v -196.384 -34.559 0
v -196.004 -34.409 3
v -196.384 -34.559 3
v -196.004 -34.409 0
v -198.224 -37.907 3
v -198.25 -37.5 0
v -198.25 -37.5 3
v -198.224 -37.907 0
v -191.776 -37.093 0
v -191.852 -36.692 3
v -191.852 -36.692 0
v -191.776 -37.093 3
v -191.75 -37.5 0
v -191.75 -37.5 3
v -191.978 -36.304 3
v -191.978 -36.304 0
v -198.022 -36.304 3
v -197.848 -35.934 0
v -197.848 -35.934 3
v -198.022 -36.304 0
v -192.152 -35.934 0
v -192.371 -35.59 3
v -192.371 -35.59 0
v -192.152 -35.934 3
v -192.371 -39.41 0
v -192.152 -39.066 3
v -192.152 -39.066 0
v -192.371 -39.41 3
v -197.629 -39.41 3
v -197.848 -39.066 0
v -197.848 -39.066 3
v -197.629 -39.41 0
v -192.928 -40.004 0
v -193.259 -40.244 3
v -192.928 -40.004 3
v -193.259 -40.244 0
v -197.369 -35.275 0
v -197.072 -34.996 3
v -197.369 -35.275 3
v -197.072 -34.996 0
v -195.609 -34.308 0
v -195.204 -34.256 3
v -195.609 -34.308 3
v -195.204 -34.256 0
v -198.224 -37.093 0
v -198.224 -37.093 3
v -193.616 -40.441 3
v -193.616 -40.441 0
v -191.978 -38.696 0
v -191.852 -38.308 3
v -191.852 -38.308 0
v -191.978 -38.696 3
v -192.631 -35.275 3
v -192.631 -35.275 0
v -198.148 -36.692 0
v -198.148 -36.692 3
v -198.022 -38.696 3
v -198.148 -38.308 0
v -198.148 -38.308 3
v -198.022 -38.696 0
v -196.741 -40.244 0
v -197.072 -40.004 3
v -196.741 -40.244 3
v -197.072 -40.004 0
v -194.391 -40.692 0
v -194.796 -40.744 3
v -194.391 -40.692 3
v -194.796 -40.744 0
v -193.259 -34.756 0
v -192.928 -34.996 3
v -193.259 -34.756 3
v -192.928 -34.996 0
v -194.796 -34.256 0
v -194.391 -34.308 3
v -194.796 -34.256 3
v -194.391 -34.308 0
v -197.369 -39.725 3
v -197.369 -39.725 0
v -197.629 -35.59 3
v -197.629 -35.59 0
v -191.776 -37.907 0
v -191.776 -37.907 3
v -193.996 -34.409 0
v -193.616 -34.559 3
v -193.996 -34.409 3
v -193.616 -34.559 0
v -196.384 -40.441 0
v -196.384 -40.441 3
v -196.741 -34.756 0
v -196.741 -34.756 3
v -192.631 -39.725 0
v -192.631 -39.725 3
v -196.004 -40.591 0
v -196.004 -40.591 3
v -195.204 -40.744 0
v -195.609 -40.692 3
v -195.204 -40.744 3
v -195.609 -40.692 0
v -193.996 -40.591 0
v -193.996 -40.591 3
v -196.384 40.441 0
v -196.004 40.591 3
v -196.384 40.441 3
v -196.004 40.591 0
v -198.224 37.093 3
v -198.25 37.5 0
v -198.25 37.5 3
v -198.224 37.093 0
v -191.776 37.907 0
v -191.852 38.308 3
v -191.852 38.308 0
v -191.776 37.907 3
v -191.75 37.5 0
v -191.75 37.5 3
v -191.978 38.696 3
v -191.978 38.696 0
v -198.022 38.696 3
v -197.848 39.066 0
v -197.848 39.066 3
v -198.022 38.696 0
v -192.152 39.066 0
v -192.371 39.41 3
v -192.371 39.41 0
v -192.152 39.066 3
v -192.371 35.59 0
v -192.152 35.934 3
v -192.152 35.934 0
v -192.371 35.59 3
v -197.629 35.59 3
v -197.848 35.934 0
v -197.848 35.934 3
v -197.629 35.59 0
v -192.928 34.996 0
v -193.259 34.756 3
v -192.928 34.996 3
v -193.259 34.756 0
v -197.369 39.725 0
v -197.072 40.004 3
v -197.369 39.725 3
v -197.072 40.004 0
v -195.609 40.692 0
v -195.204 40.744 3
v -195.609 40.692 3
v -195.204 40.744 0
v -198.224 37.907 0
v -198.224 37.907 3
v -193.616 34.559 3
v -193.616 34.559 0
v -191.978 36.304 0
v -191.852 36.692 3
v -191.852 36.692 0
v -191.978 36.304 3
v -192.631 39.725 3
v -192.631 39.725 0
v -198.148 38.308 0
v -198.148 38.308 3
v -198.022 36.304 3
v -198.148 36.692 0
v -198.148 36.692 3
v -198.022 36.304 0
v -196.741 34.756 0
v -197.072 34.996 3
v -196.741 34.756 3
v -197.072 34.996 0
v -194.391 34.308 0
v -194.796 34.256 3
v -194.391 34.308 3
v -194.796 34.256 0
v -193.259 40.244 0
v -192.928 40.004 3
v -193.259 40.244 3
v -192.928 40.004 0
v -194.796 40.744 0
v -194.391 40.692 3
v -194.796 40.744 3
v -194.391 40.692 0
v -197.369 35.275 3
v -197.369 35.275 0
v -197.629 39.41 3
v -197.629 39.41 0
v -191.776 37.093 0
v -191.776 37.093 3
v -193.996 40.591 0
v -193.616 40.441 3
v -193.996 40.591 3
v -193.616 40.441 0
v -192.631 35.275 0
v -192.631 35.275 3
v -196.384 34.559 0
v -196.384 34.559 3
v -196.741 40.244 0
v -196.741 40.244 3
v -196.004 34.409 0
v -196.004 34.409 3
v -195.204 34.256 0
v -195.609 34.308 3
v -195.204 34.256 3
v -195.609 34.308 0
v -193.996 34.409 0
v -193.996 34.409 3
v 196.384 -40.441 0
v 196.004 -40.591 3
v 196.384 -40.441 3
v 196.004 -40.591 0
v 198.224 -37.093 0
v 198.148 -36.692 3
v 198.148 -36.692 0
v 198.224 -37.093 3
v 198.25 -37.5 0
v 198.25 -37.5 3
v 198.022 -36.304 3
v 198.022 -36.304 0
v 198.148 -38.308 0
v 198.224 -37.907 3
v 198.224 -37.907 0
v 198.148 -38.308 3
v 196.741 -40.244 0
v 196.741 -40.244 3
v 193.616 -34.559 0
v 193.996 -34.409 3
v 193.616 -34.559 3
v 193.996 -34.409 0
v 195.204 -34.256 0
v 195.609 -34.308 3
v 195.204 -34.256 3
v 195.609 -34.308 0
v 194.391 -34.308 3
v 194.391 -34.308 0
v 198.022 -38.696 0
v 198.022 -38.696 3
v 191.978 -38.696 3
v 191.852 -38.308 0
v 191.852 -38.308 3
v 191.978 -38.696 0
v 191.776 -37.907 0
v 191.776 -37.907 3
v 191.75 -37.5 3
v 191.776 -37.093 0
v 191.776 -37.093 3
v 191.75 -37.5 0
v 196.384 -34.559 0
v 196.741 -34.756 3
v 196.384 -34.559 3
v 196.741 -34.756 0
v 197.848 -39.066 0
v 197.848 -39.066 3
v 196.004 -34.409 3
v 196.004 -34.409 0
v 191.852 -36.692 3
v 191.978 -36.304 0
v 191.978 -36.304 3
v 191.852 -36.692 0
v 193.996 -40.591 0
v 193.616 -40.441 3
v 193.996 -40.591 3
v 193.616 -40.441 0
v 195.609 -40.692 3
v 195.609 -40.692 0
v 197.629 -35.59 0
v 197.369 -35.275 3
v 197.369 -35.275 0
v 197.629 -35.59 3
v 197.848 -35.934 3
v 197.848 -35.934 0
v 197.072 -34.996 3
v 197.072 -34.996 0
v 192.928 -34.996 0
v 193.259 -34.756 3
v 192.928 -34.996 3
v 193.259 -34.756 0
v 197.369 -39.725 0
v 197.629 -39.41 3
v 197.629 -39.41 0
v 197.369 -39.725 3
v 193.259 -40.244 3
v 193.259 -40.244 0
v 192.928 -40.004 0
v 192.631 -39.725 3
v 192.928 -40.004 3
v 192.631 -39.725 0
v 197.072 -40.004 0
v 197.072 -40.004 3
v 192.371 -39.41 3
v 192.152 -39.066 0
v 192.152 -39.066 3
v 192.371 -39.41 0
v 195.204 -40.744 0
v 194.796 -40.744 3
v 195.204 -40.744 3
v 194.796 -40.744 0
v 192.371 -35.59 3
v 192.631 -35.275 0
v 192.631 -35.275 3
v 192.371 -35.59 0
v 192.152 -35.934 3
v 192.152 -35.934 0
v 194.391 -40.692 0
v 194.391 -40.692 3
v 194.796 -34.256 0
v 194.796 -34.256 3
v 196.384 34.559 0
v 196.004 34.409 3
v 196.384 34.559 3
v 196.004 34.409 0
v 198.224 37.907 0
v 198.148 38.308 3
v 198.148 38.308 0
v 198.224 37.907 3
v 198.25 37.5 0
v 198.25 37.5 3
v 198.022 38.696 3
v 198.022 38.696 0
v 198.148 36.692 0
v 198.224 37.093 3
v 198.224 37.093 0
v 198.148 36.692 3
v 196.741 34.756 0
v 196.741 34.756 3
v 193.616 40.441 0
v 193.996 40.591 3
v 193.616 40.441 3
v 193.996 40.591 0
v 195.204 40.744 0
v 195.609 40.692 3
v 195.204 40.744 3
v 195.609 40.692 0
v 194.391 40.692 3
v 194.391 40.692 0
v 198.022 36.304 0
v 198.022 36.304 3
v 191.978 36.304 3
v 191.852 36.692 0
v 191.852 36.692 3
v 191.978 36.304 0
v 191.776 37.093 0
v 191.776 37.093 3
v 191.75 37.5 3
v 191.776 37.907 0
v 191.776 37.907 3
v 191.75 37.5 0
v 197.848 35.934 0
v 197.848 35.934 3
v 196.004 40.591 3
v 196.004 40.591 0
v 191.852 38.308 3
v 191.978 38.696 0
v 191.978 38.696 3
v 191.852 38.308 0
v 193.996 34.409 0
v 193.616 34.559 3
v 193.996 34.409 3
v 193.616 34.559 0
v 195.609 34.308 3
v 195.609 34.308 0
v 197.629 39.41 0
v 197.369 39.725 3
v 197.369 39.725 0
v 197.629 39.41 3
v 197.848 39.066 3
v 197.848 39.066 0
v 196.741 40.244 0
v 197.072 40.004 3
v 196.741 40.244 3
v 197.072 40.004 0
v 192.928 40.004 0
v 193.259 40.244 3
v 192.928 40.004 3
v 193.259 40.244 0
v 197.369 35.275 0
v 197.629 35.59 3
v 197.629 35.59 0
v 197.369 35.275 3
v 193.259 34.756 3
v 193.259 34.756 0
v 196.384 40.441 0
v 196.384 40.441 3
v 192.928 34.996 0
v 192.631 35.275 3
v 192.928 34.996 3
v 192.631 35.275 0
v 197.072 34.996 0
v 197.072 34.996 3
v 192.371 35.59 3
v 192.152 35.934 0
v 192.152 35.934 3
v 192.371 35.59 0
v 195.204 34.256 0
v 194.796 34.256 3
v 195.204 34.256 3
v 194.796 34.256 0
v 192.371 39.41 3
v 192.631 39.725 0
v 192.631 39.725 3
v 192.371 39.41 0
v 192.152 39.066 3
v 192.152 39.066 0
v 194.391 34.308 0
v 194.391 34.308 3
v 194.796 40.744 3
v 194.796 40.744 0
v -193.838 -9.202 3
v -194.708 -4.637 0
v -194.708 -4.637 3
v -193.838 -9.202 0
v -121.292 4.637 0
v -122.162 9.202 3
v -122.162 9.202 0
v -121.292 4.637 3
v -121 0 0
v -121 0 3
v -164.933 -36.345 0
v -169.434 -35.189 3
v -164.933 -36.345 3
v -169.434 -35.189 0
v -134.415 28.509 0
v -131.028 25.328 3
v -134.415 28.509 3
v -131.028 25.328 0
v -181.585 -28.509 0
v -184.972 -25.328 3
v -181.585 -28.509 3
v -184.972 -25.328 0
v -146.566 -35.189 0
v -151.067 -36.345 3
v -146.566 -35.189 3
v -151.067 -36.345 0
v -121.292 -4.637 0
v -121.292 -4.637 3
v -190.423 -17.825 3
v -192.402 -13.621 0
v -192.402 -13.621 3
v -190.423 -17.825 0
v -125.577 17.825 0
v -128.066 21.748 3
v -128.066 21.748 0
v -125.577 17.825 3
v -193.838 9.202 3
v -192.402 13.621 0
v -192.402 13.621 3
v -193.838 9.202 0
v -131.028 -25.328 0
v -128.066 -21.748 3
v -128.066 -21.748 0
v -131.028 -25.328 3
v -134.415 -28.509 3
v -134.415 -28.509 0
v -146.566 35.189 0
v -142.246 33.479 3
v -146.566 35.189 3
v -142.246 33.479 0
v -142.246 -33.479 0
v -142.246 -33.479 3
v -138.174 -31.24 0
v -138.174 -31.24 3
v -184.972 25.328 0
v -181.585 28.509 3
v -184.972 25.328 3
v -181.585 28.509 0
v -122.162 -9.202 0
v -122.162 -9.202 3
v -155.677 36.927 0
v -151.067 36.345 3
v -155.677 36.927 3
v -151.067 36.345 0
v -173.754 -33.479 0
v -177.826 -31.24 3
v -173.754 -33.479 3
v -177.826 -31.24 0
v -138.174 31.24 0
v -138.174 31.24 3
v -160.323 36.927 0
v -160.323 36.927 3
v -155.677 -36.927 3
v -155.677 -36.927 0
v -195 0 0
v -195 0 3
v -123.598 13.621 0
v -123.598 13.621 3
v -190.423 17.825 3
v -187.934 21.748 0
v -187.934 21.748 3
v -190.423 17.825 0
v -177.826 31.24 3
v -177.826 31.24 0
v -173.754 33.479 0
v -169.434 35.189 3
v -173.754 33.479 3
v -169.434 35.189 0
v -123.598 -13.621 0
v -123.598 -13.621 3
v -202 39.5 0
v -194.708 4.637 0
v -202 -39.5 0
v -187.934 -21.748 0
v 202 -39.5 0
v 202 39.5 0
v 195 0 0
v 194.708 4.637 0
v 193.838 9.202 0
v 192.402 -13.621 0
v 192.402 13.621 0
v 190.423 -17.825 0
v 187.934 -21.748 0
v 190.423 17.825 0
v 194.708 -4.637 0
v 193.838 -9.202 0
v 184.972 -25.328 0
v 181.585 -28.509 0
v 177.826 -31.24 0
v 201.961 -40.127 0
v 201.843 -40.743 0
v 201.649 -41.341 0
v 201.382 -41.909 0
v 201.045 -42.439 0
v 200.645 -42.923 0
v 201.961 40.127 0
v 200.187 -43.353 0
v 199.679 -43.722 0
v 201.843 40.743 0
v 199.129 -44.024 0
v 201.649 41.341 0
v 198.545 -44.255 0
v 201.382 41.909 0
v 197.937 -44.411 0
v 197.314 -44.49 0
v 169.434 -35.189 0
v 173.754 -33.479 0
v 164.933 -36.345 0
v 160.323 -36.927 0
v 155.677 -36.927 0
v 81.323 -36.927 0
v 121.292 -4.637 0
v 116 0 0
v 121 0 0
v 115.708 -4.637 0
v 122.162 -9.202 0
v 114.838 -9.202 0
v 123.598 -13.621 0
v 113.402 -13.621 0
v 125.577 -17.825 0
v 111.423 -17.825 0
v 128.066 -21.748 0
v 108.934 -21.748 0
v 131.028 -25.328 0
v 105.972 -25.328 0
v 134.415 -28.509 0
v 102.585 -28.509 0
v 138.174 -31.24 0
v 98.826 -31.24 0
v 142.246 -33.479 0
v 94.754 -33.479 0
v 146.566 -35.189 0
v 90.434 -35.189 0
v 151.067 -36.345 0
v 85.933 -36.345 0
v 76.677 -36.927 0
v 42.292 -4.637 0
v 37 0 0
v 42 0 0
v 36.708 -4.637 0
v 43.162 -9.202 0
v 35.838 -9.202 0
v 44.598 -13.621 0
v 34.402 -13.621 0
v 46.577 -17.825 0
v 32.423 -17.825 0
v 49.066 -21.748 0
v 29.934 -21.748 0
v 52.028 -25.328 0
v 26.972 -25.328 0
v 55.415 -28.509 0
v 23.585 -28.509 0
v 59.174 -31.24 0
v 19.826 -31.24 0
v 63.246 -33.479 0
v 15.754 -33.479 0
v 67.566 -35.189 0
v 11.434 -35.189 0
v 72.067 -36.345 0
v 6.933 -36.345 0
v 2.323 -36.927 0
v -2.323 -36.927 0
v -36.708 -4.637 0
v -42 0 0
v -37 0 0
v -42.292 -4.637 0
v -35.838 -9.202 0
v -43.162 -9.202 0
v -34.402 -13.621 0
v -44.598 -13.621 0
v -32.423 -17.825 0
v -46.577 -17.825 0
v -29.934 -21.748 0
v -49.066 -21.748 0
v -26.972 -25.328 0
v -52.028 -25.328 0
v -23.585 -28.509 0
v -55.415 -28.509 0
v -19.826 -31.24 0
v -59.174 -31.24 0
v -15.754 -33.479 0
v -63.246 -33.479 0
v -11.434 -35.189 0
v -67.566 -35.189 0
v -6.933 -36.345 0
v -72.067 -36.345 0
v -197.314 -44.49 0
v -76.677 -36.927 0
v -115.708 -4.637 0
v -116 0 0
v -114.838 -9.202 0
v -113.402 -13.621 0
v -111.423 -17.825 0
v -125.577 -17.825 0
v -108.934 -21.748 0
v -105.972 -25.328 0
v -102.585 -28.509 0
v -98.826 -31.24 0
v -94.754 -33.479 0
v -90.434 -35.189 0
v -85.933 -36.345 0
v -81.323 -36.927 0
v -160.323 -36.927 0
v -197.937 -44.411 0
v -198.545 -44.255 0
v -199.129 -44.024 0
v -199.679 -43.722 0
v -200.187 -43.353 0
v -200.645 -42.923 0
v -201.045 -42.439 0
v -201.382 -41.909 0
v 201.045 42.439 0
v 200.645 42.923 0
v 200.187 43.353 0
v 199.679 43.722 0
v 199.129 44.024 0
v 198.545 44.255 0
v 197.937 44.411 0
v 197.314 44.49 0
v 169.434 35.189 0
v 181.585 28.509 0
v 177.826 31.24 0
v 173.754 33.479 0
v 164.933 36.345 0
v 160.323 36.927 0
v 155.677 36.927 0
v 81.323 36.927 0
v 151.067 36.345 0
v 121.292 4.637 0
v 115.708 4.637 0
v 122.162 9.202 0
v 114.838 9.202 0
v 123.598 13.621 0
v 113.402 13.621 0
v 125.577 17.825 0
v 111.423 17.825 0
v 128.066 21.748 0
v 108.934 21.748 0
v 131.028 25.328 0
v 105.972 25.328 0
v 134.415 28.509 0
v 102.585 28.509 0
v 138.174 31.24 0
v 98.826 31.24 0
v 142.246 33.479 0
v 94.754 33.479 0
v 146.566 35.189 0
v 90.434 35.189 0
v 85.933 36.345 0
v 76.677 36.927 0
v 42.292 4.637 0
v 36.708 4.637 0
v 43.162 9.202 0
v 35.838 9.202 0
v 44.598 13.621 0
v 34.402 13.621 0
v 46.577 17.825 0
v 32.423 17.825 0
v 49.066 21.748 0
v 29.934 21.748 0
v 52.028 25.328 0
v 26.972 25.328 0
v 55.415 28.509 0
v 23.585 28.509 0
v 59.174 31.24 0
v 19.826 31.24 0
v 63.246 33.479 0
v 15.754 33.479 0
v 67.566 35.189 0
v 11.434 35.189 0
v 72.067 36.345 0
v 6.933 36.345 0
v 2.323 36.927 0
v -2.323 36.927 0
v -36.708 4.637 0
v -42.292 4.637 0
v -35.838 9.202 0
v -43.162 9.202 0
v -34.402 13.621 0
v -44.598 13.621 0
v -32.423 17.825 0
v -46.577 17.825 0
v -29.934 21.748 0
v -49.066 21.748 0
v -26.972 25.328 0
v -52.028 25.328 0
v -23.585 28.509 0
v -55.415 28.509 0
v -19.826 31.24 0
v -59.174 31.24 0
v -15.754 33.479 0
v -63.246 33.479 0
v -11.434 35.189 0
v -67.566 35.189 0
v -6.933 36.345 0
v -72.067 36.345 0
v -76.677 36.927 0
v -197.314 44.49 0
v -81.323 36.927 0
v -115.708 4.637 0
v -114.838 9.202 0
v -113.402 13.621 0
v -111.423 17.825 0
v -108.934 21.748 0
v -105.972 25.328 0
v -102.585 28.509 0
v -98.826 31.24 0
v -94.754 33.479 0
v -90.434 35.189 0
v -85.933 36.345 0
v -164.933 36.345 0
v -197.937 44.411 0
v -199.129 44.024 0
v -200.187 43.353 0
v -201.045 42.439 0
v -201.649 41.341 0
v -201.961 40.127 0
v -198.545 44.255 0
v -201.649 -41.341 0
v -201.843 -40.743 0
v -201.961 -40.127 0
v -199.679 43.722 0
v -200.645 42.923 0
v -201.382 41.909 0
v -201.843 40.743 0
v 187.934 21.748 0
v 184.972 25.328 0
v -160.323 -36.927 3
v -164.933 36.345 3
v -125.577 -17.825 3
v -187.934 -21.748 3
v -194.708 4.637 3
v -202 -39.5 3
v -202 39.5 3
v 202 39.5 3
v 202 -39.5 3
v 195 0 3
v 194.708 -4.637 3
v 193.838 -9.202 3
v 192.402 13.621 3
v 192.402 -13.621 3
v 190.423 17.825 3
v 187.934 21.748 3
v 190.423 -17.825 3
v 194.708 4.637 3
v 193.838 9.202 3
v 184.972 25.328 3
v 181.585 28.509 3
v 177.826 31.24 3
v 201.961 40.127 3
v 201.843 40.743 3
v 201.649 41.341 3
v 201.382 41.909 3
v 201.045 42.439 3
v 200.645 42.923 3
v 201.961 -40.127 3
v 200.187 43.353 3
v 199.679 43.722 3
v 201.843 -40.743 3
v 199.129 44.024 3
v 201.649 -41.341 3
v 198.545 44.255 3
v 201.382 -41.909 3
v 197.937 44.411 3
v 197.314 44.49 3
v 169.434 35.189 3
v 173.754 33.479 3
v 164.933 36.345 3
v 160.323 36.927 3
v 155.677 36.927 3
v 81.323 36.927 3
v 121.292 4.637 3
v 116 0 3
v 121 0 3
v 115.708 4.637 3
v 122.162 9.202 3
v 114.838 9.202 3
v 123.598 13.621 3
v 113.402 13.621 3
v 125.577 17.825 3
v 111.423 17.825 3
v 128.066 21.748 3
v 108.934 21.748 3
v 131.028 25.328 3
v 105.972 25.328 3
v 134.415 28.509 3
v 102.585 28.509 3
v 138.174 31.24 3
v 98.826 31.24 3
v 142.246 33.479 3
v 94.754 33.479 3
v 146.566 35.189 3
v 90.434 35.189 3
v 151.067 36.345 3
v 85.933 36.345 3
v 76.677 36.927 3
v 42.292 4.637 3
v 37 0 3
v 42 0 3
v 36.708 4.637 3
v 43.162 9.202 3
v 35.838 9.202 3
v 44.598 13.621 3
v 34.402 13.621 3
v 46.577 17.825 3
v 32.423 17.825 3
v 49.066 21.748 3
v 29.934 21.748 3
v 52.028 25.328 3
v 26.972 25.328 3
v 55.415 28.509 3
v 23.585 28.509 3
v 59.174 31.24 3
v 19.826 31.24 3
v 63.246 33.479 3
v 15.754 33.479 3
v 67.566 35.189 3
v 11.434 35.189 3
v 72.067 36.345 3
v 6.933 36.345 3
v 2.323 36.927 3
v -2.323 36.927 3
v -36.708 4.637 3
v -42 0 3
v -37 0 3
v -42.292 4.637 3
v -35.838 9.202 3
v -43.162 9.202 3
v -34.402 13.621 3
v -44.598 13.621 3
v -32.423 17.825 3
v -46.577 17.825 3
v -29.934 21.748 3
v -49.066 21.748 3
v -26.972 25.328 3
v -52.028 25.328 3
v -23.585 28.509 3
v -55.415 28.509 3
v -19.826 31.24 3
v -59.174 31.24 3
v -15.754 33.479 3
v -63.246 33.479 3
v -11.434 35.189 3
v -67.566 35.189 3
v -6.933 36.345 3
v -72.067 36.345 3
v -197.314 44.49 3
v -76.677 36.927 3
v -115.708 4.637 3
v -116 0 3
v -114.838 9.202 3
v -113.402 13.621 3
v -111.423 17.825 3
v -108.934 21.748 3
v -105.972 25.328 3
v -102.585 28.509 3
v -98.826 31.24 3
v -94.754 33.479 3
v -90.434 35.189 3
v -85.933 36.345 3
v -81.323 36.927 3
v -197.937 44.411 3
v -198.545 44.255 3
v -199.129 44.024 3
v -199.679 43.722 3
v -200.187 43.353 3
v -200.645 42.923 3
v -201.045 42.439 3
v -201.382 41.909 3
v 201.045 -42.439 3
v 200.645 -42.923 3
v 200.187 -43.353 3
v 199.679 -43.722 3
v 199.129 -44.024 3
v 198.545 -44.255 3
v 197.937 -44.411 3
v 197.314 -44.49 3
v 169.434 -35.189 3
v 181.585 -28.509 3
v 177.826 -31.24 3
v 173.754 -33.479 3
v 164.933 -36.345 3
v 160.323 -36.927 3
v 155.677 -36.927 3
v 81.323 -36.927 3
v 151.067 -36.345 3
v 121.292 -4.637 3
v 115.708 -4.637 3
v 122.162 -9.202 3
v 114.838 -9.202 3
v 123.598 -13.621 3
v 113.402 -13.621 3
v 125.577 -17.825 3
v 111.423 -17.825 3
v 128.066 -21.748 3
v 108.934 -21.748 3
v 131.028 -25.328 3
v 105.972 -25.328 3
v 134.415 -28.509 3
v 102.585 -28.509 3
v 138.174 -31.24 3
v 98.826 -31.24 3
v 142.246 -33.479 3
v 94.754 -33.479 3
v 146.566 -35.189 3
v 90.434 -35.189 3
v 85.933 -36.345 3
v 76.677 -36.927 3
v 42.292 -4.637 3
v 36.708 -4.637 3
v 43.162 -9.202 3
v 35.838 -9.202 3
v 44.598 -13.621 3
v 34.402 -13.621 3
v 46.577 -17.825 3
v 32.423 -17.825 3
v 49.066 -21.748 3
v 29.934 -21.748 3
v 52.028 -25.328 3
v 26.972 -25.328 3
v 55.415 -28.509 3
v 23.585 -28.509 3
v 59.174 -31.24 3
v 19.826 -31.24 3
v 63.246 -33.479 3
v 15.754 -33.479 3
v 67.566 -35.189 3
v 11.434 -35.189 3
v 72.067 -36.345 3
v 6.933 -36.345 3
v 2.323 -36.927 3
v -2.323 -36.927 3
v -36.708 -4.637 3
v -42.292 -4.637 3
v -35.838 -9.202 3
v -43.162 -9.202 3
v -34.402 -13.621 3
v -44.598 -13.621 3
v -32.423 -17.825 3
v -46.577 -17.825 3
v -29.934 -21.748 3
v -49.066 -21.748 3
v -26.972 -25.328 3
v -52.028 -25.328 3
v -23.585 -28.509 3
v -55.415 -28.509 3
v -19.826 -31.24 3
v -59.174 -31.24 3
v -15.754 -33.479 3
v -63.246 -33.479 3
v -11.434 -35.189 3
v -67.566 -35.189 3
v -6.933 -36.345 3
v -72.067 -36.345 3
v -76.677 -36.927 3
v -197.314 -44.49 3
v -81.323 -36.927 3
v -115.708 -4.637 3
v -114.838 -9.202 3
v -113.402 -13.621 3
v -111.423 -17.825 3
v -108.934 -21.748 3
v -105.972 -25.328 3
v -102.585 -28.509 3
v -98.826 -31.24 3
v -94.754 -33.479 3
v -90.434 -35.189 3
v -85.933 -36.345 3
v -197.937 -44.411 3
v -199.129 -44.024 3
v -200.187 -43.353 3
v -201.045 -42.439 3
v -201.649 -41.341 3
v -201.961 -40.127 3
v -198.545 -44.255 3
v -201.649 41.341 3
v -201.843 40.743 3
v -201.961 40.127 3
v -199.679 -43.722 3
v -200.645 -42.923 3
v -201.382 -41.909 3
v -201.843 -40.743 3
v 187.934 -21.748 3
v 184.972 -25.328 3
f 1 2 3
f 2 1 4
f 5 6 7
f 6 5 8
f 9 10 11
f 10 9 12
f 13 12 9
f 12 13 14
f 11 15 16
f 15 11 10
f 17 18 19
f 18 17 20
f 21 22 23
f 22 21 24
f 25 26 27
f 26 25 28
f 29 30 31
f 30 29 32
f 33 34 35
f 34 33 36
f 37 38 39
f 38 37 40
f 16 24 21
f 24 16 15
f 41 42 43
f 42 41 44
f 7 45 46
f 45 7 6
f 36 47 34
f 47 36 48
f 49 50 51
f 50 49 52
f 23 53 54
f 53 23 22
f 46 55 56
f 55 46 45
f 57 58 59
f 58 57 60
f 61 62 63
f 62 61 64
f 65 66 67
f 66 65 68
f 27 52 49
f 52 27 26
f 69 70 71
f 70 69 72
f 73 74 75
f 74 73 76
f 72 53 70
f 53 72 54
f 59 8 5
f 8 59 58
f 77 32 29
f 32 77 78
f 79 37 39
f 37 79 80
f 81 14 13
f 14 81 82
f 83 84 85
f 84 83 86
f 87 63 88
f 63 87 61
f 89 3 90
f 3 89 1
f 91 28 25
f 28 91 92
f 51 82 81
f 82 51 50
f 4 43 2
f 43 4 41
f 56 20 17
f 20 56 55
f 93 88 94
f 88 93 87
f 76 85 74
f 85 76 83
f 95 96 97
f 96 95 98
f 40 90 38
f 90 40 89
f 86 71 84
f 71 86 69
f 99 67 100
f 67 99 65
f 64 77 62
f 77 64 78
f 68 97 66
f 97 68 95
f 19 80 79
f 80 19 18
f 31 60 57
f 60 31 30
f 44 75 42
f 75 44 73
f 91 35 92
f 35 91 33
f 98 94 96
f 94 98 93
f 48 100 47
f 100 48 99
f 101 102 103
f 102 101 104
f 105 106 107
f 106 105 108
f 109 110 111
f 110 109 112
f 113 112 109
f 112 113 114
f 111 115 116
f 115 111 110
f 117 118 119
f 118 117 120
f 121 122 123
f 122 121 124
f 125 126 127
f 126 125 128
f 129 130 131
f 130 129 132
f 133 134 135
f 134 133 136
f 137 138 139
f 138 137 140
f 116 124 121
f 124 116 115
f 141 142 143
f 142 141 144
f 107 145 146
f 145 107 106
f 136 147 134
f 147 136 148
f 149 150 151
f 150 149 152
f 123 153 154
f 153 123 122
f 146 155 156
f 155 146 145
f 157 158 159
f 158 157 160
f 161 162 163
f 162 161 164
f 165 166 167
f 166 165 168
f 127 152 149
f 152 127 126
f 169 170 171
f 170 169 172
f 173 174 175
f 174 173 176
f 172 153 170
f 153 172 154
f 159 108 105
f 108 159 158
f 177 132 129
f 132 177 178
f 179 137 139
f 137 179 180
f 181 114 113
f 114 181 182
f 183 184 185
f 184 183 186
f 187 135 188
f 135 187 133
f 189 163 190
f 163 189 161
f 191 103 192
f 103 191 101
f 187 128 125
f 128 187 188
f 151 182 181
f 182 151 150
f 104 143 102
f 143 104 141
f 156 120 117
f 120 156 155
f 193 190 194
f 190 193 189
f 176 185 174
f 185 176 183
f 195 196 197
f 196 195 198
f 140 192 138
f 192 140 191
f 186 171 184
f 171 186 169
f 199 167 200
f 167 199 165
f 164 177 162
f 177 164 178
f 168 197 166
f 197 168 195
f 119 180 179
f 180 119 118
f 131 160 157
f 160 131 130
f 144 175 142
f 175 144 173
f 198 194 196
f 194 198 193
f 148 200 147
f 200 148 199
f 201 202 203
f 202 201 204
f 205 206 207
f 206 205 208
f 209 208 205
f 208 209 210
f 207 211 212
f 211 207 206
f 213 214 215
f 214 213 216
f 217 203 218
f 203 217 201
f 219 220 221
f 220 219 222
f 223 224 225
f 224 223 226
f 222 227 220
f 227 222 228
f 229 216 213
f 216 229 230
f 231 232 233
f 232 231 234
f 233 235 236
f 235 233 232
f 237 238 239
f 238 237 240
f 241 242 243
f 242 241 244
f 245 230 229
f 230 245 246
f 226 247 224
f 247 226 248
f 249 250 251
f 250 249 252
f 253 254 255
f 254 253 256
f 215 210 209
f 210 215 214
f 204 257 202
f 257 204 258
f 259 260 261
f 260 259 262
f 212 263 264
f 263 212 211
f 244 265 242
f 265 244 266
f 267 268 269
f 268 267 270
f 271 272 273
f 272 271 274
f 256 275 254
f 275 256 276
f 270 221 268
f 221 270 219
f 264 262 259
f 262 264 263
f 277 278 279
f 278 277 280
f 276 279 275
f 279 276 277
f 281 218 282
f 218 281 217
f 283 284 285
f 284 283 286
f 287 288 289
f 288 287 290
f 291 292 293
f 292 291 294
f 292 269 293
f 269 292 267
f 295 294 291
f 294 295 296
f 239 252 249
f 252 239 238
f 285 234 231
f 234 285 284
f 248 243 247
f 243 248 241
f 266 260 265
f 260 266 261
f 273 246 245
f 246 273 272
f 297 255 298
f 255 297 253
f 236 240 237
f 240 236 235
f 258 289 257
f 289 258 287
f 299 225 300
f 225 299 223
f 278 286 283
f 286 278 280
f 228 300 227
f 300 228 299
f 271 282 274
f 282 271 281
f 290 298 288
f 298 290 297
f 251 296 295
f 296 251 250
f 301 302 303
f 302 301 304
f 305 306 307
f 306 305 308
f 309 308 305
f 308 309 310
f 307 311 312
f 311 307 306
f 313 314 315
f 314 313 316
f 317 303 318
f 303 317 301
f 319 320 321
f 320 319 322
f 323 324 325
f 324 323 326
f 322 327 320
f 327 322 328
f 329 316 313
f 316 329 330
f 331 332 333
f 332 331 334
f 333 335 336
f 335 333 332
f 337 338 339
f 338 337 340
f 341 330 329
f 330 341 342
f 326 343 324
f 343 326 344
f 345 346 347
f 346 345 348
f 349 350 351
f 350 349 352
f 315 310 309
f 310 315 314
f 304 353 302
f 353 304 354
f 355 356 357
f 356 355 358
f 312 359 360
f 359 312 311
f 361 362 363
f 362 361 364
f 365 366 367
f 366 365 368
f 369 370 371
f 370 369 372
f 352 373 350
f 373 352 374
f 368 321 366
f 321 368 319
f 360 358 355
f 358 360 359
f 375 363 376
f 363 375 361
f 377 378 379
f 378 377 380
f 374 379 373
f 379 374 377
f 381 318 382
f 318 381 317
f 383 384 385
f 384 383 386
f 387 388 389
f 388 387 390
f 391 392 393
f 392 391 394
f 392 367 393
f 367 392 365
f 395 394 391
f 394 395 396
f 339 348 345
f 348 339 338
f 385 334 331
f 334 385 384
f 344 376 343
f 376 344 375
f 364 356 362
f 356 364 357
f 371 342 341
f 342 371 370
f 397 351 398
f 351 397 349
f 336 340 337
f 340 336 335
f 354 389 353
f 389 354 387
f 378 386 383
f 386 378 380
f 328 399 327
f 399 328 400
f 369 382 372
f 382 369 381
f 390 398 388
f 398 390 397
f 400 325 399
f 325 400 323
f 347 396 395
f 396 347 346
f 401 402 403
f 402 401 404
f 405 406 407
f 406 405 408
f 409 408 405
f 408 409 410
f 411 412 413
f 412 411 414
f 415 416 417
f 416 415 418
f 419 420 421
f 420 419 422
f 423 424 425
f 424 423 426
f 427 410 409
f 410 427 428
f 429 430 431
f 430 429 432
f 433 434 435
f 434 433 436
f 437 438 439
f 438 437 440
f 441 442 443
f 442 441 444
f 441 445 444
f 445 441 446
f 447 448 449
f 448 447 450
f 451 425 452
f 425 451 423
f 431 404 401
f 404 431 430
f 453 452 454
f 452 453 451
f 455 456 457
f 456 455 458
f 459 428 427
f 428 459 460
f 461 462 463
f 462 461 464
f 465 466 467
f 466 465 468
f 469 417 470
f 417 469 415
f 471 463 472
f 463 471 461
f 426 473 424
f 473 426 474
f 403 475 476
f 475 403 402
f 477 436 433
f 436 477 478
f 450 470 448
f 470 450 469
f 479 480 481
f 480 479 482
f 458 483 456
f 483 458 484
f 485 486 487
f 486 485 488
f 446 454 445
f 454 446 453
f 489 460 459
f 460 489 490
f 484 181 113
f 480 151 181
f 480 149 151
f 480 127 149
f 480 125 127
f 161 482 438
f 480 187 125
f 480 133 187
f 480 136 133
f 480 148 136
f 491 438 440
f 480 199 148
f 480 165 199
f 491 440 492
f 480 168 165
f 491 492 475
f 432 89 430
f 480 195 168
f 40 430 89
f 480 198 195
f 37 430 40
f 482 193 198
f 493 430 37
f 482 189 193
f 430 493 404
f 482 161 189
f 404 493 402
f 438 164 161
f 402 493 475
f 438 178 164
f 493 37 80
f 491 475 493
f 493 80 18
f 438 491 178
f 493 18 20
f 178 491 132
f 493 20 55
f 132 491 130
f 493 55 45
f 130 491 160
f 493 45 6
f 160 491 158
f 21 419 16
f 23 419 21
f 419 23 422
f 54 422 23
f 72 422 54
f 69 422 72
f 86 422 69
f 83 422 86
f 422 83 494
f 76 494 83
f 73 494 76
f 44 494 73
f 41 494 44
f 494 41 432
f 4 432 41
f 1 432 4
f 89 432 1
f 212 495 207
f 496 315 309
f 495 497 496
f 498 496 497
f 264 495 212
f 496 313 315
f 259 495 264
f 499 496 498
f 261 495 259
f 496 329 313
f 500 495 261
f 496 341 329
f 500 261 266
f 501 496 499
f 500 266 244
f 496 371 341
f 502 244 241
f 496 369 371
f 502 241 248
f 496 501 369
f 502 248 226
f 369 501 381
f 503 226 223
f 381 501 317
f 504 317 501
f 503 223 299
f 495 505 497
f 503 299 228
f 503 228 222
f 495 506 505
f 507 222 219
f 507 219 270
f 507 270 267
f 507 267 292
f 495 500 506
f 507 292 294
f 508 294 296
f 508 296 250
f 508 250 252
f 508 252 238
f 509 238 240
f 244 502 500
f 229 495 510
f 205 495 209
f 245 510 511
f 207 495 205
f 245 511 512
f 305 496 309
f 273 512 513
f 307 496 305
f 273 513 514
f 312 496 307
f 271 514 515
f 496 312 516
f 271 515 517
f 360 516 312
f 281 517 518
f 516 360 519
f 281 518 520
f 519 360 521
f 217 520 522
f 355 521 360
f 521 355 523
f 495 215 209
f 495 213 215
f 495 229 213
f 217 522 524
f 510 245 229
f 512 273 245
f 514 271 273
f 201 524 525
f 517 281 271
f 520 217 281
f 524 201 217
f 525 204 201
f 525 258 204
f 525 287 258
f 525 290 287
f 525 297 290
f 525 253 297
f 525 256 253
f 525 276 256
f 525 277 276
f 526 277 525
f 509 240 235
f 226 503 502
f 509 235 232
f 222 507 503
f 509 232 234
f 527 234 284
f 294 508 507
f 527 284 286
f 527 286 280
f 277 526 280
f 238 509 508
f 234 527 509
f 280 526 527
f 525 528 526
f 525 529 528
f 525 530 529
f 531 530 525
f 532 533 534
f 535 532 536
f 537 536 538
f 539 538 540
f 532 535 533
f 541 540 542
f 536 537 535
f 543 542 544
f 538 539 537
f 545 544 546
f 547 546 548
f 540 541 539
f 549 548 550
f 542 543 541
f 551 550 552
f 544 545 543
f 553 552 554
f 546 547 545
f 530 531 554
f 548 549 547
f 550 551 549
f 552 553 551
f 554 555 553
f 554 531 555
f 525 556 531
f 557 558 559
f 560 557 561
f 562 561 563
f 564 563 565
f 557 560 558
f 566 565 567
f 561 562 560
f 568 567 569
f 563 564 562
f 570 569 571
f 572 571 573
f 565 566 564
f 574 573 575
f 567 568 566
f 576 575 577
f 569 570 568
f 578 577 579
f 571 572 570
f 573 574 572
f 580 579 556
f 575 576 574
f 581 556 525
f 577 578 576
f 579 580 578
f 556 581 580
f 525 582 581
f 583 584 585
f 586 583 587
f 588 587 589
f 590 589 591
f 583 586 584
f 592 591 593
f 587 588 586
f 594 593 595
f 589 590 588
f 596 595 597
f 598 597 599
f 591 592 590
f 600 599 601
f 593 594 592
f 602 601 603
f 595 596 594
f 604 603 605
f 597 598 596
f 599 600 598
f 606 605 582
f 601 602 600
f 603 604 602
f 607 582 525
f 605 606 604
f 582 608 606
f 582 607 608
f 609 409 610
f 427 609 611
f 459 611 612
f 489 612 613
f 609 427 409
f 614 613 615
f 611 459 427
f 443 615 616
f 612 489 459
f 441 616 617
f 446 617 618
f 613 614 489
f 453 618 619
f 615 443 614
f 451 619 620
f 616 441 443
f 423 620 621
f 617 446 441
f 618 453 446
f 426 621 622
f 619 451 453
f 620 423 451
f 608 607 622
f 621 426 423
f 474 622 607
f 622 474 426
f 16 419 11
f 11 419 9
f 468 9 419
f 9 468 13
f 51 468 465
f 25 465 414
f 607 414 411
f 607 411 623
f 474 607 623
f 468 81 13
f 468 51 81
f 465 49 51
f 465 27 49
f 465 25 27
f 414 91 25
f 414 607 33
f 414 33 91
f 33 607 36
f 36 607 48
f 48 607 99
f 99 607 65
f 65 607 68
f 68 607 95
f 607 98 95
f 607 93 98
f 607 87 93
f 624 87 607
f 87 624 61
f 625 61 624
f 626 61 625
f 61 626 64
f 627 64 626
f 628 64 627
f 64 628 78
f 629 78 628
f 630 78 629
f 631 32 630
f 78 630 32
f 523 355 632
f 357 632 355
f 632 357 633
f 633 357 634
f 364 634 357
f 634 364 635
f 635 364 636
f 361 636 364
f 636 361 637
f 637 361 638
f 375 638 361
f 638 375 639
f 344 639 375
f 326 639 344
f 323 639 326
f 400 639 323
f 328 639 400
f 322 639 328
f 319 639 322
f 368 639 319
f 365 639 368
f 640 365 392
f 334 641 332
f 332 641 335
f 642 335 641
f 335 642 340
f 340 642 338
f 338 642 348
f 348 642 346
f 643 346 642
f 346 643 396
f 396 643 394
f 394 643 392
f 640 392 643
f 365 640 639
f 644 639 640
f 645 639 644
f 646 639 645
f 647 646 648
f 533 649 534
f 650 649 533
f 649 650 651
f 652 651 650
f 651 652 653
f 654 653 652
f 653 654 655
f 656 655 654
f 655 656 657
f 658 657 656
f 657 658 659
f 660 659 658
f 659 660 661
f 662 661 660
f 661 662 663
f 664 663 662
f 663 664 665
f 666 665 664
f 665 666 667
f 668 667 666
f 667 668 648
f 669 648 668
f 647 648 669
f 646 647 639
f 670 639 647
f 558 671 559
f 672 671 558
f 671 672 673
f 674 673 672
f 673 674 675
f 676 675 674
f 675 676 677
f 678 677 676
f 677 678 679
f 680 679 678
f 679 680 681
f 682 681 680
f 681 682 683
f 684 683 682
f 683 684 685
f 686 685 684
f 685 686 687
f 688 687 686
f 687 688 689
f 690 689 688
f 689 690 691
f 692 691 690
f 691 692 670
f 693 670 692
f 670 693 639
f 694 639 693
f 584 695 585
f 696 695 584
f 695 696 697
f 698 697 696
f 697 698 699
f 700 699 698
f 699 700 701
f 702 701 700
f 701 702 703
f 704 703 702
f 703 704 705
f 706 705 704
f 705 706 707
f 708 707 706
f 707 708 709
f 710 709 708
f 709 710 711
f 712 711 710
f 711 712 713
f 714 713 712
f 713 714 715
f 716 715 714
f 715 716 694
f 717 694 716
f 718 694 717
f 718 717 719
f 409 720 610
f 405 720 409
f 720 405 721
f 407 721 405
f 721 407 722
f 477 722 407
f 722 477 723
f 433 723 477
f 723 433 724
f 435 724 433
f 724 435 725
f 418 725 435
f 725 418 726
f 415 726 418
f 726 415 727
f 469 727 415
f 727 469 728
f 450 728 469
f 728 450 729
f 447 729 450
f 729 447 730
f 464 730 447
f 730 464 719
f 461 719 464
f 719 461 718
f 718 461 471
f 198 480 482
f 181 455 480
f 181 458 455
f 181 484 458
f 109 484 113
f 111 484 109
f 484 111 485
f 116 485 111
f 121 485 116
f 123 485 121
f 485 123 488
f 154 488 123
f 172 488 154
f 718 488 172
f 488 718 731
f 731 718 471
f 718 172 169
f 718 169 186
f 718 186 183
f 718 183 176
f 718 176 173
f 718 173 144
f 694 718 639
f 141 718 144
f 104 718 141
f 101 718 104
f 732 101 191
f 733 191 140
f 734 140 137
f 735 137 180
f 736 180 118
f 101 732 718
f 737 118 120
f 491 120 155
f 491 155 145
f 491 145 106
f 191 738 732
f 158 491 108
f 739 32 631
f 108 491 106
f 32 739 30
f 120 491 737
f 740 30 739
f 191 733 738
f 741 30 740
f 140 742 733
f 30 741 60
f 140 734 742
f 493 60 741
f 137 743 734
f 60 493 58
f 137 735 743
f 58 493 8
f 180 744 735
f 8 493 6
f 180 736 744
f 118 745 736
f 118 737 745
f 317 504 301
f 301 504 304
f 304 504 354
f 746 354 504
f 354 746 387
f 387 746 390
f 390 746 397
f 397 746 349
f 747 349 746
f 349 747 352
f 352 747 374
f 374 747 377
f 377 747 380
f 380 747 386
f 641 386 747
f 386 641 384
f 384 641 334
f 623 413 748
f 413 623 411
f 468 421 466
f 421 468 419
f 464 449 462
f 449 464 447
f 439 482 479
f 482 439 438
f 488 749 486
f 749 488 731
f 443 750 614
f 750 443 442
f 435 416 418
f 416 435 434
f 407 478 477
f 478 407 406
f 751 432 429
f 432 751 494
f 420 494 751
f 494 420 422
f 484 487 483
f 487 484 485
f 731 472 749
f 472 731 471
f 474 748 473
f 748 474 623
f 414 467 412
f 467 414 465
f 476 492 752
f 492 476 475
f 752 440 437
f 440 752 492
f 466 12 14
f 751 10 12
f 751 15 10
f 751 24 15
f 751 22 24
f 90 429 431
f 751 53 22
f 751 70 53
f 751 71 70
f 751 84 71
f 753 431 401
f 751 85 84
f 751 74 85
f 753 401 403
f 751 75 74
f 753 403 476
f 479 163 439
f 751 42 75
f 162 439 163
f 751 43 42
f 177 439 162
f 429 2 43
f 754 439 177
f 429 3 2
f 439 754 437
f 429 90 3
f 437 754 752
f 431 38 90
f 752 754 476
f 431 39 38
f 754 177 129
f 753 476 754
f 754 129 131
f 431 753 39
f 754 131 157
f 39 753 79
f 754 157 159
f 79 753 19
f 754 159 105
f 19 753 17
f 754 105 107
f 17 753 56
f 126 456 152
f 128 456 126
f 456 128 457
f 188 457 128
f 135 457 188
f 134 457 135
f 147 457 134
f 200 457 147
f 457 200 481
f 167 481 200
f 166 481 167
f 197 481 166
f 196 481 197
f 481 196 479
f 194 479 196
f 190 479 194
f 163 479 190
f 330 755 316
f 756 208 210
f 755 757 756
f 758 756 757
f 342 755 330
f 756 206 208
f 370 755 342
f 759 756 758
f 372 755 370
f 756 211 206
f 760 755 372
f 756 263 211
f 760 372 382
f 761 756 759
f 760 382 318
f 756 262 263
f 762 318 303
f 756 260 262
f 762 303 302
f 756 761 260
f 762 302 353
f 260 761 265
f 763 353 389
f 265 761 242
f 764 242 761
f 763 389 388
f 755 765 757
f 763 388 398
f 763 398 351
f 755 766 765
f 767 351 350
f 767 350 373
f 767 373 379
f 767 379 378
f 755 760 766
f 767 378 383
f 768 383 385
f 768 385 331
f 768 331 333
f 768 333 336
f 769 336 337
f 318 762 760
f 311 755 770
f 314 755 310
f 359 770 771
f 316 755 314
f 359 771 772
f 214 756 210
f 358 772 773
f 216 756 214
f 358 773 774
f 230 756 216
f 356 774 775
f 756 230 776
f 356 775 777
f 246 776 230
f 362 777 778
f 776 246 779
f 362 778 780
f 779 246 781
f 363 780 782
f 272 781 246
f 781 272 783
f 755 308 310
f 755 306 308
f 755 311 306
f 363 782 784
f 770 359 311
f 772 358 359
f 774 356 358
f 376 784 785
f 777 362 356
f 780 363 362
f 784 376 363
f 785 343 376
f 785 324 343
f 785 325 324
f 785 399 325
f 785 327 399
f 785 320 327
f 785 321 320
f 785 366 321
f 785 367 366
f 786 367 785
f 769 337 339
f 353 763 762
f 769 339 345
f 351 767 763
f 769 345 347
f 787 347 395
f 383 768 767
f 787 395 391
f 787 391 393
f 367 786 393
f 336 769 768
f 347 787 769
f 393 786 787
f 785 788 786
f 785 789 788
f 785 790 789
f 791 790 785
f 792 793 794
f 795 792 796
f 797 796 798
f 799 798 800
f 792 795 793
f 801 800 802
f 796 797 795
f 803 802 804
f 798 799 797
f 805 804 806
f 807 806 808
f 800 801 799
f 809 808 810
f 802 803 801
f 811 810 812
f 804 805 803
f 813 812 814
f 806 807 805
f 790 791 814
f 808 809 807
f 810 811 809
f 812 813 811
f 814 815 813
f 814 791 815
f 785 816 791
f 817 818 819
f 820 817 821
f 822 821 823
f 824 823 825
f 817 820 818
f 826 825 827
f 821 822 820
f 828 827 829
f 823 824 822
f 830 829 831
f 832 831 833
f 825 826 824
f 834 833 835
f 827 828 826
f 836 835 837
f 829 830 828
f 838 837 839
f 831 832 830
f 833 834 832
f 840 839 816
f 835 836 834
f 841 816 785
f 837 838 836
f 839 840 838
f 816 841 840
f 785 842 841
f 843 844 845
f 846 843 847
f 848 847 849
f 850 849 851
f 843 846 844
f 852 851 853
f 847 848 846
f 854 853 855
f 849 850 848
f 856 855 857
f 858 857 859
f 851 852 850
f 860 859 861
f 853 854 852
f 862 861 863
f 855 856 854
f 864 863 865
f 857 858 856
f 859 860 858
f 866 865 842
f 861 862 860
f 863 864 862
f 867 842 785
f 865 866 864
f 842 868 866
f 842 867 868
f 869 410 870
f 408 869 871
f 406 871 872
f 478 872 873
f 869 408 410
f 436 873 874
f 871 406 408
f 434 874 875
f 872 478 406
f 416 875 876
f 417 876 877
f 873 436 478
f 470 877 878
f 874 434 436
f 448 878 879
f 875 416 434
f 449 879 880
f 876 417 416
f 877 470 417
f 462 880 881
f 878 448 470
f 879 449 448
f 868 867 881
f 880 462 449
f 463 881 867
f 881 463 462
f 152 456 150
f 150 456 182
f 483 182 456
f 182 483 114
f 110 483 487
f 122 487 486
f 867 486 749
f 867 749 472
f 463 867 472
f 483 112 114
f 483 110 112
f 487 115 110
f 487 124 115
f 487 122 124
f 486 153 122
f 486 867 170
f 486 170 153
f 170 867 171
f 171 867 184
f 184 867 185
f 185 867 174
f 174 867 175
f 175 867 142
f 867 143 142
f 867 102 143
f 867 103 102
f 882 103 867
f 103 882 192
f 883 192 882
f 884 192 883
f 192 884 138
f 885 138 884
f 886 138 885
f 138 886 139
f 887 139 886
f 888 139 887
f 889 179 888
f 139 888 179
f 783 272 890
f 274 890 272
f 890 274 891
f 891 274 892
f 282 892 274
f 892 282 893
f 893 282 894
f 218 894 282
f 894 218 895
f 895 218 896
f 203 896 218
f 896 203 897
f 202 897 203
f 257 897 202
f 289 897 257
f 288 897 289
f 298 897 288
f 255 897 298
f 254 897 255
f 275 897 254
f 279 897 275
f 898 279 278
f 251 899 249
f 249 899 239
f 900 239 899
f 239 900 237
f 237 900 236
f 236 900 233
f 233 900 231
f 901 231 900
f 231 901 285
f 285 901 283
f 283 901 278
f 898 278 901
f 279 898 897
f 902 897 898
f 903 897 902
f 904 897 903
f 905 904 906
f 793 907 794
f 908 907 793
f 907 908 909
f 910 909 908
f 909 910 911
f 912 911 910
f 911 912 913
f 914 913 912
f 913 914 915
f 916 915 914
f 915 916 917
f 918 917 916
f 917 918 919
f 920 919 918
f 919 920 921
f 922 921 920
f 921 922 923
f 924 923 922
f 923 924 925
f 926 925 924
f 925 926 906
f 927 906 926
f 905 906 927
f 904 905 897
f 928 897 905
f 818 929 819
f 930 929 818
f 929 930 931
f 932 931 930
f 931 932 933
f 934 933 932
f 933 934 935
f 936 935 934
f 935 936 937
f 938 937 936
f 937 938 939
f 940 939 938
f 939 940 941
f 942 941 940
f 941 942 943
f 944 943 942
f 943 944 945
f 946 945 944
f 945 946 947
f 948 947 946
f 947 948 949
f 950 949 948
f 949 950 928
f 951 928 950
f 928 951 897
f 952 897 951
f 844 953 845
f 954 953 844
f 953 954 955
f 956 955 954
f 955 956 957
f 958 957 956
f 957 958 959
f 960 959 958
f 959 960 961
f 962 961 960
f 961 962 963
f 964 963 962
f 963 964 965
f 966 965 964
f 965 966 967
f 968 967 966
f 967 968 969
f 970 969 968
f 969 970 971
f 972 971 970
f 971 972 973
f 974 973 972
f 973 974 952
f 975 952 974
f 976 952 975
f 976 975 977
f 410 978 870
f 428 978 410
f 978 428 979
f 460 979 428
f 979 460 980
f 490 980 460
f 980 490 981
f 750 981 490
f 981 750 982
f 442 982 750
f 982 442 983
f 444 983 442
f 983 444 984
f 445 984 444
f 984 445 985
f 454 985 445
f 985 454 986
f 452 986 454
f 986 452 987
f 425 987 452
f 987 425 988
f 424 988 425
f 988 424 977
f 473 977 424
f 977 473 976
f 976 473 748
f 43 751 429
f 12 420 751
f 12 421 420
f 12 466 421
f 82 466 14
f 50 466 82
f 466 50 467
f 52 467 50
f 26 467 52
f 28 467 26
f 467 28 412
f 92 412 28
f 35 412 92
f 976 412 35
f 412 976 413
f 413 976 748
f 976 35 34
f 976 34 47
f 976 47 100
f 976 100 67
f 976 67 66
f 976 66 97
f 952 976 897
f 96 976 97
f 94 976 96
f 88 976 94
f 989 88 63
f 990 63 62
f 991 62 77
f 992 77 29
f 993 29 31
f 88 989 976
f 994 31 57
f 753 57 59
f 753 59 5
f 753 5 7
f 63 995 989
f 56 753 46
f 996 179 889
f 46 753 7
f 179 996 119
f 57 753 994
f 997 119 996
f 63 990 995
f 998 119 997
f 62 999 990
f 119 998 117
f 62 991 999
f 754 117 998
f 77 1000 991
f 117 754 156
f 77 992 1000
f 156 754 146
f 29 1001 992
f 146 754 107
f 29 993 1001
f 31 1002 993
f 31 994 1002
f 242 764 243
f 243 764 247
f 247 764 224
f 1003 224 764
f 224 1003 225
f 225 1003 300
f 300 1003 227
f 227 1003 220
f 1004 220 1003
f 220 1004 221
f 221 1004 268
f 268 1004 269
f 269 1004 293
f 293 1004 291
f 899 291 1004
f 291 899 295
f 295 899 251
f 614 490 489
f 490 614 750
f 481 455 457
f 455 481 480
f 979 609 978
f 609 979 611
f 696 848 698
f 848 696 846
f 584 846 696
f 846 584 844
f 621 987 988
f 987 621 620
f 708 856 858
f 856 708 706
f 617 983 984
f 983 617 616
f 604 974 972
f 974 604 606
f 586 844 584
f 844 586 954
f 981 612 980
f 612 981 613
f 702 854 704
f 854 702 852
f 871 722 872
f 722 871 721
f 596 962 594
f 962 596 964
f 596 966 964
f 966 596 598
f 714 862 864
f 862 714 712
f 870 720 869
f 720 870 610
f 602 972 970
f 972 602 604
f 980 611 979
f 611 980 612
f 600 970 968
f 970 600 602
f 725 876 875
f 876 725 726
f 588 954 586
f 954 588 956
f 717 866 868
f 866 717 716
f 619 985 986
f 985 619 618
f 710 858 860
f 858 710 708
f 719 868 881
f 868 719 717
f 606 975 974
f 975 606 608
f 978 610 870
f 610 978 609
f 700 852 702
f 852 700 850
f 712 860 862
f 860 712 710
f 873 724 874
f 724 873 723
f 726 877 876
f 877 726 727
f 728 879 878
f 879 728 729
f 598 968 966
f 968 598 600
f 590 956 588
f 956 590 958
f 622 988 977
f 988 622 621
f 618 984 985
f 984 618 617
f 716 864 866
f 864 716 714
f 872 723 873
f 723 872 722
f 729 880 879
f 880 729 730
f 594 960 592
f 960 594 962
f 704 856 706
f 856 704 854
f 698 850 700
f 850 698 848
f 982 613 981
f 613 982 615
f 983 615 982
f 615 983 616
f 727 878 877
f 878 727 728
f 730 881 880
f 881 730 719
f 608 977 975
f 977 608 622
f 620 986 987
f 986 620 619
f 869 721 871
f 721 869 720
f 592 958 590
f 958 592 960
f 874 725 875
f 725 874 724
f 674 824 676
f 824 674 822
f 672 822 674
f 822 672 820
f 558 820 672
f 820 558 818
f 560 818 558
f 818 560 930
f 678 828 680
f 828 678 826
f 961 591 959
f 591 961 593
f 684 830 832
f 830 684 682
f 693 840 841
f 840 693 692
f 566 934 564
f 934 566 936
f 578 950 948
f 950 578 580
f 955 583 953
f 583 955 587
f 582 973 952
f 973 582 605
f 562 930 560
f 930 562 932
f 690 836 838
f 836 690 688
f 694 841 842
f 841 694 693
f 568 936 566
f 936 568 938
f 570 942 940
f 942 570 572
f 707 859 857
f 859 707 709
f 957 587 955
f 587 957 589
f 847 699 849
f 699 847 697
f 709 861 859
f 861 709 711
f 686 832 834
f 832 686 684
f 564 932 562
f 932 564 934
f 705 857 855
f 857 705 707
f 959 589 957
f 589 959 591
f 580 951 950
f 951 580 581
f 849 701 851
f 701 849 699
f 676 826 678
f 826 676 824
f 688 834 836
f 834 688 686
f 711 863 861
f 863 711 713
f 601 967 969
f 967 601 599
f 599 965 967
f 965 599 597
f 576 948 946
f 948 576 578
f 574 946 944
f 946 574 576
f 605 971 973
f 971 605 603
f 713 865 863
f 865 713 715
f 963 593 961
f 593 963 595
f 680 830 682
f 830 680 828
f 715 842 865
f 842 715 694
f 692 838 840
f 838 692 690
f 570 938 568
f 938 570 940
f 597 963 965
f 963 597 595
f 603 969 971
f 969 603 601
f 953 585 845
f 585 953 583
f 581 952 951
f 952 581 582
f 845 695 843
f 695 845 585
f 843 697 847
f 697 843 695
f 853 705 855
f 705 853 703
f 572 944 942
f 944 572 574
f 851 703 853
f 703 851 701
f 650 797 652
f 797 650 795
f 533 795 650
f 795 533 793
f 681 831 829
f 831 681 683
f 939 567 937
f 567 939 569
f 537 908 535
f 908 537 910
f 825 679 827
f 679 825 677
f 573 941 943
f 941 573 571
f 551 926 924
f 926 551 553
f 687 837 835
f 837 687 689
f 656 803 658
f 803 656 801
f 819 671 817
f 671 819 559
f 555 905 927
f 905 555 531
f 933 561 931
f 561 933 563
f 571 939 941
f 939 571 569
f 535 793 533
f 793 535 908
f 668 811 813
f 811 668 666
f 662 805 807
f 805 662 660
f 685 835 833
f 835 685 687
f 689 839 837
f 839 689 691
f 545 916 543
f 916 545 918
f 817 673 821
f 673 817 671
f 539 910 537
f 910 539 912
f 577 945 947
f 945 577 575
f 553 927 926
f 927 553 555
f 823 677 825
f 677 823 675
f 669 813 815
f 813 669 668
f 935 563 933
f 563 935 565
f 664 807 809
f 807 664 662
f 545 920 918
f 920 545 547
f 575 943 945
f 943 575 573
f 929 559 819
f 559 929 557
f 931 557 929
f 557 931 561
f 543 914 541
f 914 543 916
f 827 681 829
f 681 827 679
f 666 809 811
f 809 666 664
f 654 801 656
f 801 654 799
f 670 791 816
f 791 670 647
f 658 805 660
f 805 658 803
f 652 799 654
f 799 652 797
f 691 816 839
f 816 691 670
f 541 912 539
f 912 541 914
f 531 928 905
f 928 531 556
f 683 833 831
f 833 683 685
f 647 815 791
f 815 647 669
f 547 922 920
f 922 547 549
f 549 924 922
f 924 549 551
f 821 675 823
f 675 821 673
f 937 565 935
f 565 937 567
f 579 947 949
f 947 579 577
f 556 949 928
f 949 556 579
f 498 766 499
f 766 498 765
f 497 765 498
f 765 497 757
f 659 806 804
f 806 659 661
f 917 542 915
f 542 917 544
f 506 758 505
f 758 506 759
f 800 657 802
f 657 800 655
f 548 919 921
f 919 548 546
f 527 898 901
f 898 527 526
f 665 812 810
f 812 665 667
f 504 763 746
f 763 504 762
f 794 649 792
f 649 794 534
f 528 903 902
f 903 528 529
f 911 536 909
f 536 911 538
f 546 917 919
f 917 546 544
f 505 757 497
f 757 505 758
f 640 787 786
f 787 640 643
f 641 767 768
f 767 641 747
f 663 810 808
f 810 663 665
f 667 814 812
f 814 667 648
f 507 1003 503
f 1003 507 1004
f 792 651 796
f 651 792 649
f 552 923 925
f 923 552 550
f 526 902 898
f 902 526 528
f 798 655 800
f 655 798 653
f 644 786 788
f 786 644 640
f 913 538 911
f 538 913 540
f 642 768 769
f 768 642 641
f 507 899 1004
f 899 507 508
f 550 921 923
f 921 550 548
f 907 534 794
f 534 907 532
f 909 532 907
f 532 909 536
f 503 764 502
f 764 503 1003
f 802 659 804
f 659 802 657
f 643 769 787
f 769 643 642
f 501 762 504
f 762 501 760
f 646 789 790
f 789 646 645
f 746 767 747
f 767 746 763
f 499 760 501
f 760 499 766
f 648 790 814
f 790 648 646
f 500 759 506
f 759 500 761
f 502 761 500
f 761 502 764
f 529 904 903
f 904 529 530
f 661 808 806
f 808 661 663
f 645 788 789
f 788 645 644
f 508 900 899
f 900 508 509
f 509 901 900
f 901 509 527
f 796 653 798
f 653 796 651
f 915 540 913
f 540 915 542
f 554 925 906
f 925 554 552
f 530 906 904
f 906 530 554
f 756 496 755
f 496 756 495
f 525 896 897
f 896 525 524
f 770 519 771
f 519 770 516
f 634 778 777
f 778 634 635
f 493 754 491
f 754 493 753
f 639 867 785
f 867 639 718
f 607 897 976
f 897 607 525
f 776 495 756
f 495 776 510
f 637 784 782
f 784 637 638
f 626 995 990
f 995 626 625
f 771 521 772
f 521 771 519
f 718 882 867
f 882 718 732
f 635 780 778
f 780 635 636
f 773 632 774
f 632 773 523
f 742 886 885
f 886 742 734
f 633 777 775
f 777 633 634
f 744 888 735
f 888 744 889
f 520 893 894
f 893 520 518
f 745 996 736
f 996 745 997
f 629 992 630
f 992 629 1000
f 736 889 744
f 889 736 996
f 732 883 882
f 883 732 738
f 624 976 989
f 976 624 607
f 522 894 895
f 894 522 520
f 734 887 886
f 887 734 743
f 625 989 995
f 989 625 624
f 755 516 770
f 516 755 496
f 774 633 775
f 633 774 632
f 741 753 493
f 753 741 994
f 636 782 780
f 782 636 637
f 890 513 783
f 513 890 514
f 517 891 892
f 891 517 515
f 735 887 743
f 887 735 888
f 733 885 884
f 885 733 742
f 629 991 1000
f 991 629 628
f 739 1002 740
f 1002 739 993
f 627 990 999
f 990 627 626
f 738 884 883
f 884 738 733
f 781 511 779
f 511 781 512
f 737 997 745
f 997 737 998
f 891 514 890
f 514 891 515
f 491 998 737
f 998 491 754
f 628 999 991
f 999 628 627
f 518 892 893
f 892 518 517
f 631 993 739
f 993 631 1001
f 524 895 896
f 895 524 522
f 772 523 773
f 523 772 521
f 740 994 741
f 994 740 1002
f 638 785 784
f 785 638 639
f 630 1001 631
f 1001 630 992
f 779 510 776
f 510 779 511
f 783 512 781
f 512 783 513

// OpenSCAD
$fn = 50;

difference() {
	union() {
		hull() {
			translate(v = [-197.0, 39.5, 0]) {
				cylinder(h = 3, r = 5);
			}
			translate(v = [197.0, 39.5, 0]) {
				cylinder(h = 3, r = 5);
			}
			translate(v = [-197.0, -39.5, 0]) {
				cylinder(h = 3, r = 5);
			}
			translate(v = [197.0, -39.5, 0]) {
				cylinder(h = 3, r = 5);
			}
		}
	}
	union() {
		translate(v = [-195.0, -37.5, -100.0]) {
			cylinder(h = 200, r = 3.25);
		}
		translate(v = [-195.0, 37.5, -100.0]) {
			cylinder(h = 200, r = 3.25);
		}
		translate(v = [195.0, -37.5, -100.0]) {
			cylinder(h = 200, r = 3.25);
		}
		translate(v = [195.0, 37.5, -100.0]) {
			cylinder(h = 200, r = 3.25);
		}
		translate(v = [-195.0, -37.5, -100.0]) {
			cylinder(h = 200, r = 1.8);
		}
		translate(v = [-195.0, 37.5, -100.0]) {
			cylinder(h = 200, r = 1.8);
		}
		translate(v = [195.0, -37.5, -100.0]) {
			cylinder(h = 200, r = 1.8);
		}
		translate(v = [195.0, 37.5, -100.0]) {
			cylinder(h = 200, r = 1.8);
		}
		translate(v = [-158.0, 0, 0.0]) {
			cylinder(h = 3, r = 37.0);
		}
		translate(v = [-79.0, 0, 0.0]) {
			cylinder(h = 3, r = 37.0);
		}
		cylinder(h = 3, r = 37.0);
		translate(v = [79.0, 0, 0.0]) {
			cylinder(h = 3, r = 37.0);
		}
		translate(v = [158.0, 0, 0.0]) {
			cylinder(h = 3, r = 37.0);
		}
	}
}
